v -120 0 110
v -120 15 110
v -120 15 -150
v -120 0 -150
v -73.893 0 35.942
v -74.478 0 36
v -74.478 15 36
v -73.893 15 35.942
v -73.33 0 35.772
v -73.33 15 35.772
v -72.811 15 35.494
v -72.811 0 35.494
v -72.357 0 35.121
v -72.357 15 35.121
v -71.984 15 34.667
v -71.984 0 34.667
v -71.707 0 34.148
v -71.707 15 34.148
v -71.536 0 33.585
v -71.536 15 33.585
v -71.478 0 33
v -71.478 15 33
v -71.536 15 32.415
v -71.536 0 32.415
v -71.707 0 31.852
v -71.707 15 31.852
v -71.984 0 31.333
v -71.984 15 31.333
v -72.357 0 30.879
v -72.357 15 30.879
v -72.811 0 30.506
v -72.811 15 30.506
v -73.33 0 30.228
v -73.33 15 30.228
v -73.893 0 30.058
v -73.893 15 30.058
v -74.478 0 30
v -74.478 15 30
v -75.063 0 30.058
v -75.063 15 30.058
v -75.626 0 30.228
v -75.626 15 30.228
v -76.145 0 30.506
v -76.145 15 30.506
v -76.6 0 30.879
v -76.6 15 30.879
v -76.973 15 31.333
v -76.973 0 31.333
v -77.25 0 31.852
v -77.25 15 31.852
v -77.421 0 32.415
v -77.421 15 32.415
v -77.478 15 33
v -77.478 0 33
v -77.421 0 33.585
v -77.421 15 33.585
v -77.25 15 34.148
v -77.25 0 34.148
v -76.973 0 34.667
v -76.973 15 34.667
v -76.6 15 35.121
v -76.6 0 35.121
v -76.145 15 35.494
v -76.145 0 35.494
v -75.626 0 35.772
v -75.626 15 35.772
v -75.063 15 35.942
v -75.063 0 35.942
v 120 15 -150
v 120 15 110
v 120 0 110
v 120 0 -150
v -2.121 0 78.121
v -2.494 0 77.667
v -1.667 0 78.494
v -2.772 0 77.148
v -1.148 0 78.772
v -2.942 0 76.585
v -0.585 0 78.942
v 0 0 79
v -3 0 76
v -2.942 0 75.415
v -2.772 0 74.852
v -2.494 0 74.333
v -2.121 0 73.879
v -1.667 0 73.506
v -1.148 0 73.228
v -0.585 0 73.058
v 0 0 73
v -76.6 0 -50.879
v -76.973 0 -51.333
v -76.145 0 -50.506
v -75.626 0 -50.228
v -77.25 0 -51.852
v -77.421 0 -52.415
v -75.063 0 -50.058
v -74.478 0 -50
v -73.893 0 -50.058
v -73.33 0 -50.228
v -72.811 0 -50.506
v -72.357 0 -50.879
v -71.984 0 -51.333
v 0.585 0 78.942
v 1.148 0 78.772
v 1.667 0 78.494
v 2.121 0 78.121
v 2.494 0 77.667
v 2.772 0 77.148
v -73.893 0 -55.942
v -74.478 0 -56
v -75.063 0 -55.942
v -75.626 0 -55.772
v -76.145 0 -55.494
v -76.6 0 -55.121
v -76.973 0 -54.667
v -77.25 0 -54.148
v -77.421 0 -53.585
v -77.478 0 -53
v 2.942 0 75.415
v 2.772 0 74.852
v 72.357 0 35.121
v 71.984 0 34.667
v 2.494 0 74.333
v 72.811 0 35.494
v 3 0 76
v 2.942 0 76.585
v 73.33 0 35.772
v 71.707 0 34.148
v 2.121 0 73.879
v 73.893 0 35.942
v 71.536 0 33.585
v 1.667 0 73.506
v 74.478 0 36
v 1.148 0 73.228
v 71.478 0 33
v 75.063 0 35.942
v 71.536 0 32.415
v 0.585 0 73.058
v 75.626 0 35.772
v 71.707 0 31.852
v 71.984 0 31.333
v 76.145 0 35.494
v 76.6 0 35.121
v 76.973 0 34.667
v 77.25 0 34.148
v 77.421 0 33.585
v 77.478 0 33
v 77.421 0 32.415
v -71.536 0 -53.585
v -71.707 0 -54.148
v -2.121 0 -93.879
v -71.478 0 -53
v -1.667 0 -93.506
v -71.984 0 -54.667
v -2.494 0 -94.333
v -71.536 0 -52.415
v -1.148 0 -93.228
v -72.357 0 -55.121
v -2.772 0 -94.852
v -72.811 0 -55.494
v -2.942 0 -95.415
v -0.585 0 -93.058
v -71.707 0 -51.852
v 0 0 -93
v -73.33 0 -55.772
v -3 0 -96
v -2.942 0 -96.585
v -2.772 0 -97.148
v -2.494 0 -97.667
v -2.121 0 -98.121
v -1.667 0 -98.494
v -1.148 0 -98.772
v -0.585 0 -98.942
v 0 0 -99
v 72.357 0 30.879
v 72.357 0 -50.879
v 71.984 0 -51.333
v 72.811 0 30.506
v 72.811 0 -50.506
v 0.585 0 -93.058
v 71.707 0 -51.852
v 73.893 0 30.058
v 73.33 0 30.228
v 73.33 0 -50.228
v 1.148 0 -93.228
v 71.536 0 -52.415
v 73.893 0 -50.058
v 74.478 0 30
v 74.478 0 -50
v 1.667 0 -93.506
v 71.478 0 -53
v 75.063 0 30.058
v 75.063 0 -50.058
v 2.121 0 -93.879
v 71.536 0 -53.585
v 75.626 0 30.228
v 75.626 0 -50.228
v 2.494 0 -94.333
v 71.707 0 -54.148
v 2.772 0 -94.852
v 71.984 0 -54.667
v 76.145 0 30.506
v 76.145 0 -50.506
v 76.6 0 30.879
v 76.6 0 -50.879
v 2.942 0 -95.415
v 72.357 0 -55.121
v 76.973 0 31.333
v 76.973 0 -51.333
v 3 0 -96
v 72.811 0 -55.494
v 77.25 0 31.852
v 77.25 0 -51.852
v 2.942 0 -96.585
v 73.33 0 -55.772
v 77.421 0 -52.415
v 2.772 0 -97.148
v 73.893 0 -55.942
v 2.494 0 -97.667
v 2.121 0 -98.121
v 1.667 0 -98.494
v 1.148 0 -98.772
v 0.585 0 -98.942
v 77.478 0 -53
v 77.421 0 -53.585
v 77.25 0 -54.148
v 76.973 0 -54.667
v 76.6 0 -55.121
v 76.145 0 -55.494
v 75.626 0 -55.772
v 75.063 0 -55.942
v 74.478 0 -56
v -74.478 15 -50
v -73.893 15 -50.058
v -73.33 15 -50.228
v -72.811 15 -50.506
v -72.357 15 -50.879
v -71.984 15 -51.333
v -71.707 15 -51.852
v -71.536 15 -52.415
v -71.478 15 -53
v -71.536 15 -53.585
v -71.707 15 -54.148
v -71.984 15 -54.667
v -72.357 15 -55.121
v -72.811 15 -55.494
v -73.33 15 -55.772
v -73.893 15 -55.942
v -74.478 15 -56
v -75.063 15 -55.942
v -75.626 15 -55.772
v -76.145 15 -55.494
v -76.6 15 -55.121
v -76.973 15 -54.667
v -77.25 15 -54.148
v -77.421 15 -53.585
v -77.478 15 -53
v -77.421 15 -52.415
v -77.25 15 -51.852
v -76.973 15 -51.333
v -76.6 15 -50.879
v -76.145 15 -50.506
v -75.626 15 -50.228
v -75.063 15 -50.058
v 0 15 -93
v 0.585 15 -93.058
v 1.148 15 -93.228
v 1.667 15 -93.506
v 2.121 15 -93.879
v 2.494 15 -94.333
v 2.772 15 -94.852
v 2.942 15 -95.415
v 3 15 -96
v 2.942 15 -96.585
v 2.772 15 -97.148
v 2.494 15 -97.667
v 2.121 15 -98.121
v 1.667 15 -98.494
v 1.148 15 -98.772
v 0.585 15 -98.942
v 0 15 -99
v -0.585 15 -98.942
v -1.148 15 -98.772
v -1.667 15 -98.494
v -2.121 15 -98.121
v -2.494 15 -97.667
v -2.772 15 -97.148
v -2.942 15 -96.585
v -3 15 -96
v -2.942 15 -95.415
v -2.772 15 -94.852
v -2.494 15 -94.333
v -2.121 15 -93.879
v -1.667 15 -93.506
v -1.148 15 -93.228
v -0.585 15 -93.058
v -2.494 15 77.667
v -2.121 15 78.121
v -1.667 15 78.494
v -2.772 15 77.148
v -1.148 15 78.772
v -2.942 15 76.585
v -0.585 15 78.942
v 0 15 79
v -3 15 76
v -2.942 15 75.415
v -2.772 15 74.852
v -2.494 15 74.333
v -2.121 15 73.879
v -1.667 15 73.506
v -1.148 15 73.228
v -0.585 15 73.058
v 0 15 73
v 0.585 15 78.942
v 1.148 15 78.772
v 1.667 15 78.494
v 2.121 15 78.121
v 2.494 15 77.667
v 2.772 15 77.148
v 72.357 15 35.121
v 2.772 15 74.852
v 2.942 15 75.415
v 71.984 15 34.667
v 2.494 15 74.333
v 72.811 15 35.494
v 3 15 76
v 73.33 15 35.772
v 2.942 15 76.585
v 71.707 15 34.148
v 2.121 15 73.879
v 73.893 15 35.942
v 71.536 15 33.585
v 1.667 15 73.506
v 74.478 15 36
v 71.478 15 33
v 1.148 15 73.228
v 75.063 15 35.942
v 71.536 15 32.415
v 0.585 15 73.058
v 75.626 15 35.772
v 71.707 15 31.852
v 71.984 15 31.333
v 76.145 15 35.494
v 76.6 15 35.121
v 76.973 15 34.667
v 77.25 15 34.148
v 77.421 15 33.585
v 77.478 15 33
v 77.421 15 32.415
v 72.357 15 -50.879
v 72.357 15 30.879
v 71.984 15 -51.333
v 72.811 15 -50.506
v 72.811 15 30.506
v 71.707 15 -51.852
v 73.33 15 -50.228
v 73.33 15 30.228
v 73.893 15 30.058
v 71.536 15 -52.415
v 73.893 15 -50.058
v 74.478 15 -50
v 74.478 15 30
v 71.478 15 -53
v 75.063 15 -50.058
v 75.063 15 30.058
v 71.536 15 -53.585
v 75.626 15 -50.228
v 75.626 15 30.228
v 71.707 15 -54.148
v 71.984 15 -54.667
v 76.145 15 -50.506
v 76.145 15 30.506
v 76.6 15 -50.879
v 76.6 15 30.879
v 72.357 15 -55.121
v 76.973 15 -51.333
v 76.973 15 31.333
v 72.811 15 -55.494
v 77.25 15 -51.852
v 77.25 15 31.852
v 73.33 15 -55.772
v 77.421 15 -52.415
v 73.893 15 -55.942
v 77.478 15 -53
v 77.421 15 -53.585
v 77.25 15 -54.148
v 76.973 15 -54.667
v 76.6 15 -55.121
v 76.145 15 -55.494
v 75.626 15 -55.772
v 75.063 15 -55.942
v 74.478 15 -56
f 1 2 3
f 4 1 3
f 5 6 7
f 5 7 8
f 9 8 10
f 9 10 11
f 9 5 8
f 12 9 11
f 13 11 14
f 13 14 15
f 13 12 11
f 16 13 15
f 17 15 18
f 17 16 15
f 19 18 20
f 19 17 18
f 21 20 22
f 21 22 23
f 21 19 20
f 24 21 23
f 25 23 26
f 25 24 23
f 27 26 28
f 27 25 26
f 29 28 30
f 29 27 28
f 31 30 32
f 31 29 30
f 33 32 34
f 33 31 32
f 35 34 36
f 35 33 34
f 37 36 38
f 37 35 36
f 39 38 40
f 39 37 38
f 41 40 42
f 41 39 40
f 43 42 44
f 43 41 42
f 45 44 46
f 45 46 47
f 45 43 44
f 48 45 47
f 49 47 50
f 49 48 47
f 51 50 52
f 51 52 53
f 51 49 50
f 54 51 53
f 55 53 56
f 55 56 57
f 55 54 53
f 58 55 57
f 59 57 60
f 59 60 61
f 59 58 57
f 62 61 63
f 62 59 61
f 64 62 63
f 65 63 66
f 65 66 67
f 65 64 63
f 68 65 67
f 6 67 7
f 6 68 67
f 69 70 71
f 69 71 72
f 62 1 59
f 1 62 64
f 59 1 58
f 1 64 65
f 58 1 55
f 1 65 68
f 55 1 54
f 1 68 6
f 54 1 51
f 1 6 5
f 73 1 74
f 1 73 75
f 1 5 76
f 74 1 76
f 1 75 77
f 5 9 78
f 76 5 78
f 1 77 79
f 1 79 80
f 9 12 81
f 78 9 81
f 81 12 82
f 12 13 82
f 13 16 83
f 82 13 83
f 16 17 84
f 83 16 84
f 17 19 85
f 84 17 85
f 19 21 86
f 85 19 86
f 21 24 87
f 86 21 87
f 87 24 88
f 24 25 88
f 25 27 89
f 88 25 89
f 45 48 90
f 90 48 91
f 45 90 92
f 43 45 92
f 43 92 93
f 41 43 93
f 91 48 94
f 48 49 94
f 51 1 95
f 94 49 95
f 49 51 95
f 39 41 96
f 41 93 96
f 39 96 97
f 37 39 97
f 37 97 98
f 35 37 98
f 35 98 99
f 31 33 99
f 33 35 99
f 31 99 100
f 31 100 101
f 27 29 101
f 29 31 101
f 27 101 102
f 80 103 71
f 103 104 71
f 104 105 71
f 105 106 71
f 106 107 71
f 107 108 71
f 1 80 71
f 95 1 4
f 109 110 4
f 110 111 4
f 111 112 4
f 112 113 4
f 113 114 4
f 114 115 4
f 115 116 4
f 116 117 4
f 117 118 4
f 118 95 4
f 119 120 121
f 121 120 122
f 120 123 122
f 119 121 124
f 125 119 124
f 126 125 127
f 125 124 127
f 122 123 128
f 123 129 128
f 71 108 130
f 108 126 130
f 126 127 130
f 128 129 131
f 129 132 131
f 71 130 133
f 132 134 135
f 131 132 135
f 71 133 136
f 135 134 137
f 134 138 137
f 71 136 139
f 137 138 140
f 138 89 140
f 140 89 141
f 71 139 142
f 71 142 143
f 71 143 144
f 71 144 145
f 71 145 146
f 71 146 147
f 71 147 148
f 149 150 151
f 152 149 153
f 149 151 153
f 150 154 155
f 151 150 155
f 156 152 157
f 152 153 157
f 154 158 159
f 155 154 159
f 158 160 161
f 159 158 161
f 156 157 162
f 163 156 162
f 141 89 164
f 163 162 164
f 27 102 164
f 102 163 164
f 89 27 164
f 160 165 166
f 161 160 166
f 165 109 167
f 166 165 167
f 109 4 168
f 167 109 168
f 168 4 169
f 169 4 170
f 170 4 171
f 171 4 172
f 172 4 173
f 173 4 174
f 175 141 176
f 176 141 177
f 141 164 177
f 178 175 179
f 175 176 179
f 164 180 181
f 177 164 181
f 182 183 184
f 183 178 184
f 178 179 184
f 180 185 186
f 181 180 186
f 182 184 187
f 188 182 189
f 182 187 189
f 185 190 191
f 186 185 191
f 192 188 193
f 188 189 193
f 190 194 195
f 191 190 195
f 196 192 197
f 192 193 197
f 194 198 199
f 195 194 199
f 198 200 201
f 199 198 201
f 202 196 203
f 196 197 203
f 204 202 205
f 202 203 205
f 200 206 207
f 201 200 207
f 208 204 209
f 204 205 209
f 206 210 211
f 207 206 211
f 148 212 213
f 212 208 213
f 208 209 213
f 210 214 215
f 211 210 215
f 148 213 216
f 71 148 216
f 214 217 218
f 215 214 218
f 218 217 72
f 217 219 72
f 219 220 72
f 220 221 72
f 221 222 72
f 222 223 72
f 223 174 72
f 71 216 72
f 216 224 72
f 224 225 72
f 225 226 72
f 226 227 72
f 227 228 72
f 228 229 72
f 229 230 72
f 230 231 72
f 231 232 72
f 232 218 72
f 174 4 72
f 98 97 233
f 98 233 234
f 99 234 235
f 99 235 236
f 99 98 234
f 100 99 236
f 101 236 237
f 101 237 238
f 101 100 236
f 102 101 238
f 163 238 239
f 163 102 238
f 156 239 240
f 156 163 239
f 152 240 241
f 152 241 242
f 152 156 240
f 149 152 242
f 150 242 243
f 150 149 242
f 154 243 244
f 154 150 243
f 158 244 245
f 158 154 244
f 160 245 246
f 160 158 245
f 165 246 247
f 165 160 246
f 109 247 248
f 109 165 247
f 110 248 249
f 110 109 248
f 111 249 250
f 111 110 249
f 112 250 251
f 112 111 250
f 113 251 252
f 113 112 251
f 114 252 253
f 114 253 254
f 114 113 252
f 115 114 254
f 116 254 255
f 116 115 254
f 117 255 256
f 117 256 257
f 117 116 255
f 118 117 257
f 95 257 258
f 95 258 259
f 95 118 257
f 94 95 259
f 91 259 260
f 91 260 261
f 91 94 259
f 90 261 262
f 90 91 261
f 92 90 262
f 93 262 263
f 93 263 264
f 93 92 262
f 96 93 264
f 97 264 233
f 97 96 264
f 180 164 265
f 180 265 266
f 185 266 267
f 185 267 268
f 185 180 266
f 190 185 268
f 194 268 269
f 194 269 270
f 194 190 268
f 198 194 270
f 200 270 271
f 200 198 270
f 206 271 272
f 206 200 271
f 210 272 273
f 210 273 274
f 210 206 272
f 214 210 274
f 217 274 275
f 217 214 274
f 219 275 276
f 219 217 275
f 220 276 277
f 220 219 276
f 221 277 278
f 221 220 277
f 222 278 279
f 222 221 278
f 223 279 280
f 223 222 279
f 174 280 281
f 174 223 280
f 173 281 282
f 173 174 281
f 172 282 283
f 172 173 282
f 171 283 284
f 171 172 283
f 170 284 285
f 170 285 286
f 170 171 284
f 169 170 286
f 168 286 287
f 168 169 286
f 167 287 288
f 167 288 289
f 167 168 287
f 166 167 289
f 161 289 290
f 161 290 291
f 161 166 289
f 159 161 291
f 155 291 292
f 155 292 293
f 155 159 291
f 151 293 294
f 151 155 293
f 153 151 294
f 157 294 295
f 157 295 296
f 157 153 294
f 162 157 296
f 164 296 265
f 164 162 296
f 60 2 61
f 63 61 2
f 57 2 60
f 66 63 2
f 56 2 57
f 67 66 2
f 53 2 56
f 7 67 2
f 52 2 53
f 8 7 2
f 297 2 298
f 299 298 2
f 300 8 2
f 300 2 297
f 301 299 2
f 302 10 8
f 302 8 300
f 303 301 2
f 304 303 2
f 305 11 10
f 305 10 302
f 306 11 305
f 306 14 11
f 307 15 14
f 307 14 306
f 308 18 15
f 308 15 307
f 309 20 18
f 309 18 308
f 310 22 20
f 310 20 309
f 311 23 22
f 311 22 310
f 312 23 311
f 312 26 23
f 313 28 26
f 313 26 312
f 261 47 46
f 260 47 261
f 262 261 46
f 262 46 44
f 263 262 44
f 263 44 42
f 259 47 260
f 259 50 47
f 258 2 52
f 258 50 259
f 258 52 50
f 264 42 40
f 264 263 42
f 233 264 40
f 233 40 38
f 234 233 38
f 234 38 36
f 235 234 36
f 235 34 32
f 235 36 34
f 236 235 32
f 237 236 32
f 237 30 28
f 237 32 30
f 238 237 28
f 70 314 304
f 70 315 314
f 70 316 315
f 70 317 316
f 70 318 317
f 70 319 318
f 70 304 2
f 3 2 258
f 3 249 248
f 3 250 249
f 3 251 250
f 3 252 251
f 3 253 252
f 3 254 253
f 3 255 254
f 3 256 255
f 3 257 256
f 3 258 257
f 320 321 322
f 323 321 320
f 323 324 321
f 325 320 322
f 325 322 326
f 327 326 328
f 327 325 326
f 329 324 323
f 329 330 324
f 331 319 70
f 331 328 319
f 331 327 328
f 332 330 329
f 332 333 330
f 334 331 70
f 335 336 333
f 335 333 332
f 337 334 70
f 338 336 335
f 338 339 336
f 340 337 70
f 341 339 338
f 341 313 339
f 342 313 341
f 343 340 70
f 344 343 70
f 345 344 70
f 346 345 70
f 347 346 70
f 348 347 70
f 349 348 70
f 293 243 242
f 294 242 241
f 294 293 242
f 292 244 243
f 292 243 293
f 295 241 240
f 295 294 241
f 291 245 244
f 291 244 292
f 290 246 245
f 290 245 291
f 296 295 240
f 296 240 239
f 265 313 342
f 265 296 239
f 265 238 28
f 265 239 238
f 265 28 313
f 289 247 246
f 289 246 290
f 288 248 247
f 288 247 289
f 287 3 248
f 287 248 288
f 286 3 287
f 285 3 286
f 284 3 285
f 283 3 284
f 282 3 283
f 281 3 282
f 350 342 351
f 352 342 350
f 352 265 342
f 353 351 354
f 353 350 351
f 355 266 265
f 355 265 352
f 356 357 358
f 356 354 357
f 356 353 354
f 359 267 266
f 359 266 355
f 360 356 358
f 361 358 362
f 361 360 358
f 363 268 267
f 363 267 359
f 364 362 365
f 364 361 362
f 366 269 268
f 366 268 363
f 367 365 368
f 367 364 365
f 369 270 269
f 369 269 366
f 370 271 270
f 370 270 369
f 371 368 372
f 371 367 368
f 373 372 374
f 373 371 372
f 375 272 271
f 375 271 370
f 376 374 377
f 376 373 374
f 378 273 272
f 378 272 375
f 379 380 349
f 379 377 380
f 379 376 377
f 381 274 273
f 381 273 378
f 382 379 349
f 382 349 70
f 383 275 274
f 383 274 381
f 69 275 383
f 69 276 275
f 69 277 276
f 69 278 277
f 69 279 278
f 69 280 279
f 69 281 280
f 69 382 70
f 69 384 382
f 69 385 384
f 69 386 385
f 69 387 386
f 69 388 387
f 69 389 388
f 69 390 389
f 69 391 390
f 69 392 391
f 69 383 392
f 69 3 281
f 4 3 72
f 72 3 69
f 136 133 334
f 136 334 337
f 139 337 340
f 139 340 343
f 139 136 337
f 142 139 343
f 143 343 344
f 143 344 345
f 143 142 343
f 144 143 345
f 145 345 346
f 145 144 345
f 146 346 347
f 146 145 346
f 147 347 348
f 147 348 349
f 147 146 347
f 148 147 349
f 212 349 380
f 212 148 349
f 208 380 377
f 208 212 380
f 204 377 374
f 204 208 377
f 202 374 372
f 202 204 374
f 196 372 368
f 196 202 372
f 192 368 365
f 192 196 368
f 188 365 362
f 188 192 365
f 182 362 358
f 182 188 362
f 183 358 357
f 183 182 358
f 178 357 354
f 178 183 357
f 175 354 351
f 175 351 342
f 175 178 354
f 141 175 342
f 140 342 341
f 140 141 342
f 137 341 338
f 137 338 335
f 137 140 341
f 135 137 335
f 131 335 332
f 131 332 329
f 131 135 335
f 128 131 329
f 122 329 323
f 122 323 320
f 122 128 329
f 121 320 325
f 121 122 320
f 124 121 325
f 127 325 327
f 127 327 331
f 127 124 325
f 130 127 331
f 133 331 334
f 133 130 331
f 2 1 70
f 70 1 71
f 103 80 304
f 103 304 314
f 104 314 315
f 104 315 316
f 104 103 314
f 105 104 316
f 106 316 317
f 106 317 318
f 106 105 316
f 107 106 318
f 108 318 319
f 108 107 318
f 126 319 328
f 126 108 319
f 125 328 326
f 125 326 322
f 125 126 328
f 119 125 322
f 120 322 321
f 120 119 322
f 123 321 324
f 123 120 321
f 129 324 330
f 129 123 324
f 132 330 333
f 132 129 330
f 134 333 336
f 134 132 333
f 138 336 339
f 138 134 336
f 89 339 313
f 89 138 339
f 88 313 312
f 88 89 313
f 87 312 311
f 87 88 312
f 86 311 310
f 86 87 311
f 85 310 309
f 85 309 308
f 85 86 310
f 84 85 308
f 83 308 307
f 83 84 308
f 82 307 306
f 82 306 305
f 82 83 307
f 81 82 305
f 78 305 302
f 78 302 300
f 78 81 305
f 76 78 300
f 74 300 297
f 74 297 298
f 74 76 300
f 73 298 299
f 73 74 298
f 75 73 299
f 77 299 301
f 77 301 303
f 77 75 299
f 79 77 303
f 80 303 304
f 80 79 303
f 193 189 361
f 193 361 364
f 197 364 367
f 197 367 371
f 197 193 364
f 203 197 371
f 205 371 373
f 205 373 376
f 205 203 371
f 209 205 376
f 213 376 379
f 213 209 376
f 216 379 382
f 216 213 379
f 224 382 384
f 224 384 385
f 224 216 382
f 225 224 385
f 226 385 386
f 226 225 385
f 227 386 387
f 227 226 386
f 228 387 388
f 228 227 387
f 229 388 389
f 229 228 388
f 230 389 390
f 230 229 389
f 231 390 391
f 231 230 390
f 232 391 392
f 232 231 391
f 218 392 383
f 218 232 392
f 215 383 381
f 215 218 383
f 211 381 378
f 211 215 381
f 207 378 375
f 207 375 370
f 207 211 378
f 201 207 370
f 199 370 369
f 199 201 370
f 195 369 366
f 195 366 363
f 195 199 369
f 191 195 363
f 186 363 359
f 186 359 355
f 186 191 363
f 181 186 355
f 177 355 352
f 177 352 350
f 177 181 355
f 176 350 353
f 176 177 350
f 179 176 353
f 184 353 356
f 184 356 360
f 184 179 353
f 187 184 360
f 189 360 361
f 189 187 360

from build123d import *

# Parameters (mm, degrees)
CROQUIS1_W              = 240
CROQUIS1_H              = 220
CROQUIS1_R              = 3
SALIENTE_EXTRUIR1_DEPTH = 15
CROQUIS2_W              = 240
CROQUIS2_H              = 40
SALIENTE_EXTRUIR2_DEPTH = 15


with BuildPart() as part:
    # Croquis1 → Saliente-Extruir1 (new body)
    with BuildSketch(Plane(origin=(0, 0, 0), x_dir=(1, 0, 0), z_dir=(0, 1, 0))):
        Rectangle(CROQUIS1_W, CROQUIS1_H)
        with Locations(Location((0, 96, 0), (0, 0, 270))):
            Circle(CROQUIS1_R, mode=Mode.SUBTRACT)
        with Locations(Location((0, -76, 0), (0, 0, 270))):
            Circle(CROQUIS1_R, mode=Mode.SUBTRACT)
        with Locations(Location((-74.47818473, 53, 0), (0, 0, 270))):
            Circle(CROQUIS1_R, mode=Mode.SUBTRACT)
        with Locations(Location((-74.47818473, -33, 0), (0, 0, 270))):
            Circle(CROQUIS1_R, mode=Mode.SUBTRACT)
        with Locations(Location((74.47818473, 53, 0), (0, 0, 270))):
            Circle(CROQUIS1_R, mode=Mode.SUBTRACT)
        with Locations(Location((74.47818473, -33, 0), (0, 0, 270))):
            Circle(CROQUIS1_R, mode=Mode.SUBTRACT)
    extrude(amount=SALIENTE_EXTRUIR1_DEPTH)

    # Croquis2 → Saliente-Extruir2 (add)
    with BuildSketch(Plane(origin=(0, 15, 0), x_dir=(1, 0, 0), z_dir=(0, 1, 0))):
        with Locations((0, 130)):
            Rectangle(CROQUIS2_W, CROQUIS2_H)
    extrude(amount=-SALIENTE_EXTRUIR2_DEPTH)


solid = part.part
